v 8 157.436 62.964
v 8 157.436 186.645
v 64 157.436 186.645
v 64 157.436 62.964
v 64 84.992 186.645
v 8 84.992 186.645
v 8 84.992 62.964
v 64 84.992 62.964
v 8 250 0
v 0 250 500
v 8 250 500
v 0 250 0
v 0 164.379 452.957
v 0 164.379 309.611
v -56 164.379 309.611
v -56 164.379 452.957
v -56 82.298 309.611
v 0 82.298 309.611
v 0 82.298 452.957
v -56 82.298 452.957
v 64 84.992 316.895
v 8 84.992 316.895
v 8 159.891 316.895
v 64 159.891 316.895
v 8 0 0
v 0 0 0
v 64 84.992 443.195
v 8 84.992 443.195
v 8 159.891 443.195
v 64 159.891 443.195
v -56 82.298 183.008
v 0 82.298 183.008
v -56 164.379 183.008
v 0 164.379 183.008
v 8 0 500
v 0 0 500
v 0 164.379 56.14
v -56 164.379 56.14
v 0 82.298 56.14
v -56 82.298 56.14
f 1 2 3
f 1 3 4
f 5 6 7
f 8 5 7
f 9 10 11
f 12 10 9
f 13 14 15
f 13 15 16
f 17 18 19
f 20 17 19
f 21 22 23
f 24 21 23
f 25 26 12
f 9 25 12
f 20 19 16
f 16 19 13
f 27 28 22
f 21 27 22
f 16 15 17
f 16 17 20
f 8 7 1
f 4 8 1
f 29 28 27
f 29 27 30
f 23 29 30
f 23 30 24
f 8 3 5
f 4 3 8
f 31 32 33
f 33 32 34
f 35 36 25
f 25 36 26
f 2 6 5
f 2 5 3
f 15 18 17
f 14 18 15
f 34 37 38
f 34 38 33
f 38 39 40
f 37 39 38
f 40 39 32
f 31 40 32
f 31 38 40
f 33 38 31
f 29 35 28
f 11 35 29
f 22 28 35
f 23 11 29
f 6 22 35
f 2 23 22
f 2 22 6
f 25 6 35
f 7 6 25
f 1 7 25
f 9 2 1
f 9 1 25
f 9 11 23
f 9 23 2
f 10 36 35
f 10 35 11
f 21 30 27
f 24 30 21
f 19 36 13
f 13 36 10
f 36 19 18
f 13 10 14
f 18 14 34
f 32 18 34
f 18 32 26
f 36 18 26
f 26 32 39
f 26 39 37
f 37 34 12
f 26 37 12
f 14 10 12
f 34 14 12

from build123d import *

# Parameters (mm, degrees)
CROQUIS1_W              = 500
CROQUIS1_H              = 250
SALIENTE_EXTRUIR1_DEPTH = 8
CROQUIS2_W              = 126.86716197
CROQUIS2_H              = 82.080673108
CROQUIS2_W_2            = 143.345907008
SALIENTE_EXTRUIR2_DEPTH = 56
CROQUIS4_W              = 126.86716197
CROQUIS4_H              = 82.080673108
SALIENTE_EXTRUIR4_DEPTH = 56
CROQUIS6_W              = 126.300102785
CROQUIS6_H              = 74.898758159
SALIENTE_EXTRUIR5_DEPTH = 56
CROQUIS7_W              = 123.680930687
CROQUIS7_H              = 72.443779117
SALIENTE_EXTRUIR6_DEPTH = 56


with BuildPart() as part:
    # Croquis1 → Saliente-Extruir1 (new body)
    with BuildSketch(Plane(origin=(0, 0, 0), x_dir=(0, 0, -1), z_dir=(1, 0, 0))):
        with Locations((-250, 125)):
            Rectangle(CROQUIS1_W, CROQUIS1_H)
    extrude(amount=SALIENTE_EXTRUIR1_DEPTH)

    # Croquis2 → Saliente-Extruir2 (add)
    with BuildSketch(Plane.ZY):
        with Locations((119.573923975, 123.338686018)):
            Rectangle(CROQUIS2_W, CROQUIS2_H)
        with Locations((381.283910617, 123.338686018)):
            Rectangle(CROQUIS2_W_2, CROQUIS2_H)
    extrude(amount=SALIENTE_EXTRUIR2_DEPTH)

    # Croquis4 → Saliente-Extruir4 (add)
    with BuildSketch(Plane.ZY):
        with Locations((119.573923975, 123.338686018)):
            Rectangle(CROQUIS4_W, CROQUIS4_H)
    extrude(amount=SALIENTE_EXTRUIR4_DEPTH)

    # Croquis6 → Saliente-Extruir5 (add)
    with BuildSketch(Plane(origin=(8, 0, 0), x_dir=(0, 0, -1), z_dir=(1, 0, 0))):
        with Locations((-380.044849003, 122.441200165)):
            Rectangle(CROQUIS6_W, CROQUIS6_H)
    extrude(amount=SALIENTE_EXTRUIR5_DEPTH)

    # Croquis7 → Saliente-Extruir6 (add)
    with BuildSketch(Plane(origin=(8, 0, 0), x_dir=(0, 0, -1), z_dir=(1, 0, 0))):
        with Locations((-124.804336035, 121.213710644)):
            Rectangle(CROQUIS7_W, CROQUIS7_H)
    extrude(amount=SALIENTE_EXTRUIR6_DEPTH)


solid = part.part
